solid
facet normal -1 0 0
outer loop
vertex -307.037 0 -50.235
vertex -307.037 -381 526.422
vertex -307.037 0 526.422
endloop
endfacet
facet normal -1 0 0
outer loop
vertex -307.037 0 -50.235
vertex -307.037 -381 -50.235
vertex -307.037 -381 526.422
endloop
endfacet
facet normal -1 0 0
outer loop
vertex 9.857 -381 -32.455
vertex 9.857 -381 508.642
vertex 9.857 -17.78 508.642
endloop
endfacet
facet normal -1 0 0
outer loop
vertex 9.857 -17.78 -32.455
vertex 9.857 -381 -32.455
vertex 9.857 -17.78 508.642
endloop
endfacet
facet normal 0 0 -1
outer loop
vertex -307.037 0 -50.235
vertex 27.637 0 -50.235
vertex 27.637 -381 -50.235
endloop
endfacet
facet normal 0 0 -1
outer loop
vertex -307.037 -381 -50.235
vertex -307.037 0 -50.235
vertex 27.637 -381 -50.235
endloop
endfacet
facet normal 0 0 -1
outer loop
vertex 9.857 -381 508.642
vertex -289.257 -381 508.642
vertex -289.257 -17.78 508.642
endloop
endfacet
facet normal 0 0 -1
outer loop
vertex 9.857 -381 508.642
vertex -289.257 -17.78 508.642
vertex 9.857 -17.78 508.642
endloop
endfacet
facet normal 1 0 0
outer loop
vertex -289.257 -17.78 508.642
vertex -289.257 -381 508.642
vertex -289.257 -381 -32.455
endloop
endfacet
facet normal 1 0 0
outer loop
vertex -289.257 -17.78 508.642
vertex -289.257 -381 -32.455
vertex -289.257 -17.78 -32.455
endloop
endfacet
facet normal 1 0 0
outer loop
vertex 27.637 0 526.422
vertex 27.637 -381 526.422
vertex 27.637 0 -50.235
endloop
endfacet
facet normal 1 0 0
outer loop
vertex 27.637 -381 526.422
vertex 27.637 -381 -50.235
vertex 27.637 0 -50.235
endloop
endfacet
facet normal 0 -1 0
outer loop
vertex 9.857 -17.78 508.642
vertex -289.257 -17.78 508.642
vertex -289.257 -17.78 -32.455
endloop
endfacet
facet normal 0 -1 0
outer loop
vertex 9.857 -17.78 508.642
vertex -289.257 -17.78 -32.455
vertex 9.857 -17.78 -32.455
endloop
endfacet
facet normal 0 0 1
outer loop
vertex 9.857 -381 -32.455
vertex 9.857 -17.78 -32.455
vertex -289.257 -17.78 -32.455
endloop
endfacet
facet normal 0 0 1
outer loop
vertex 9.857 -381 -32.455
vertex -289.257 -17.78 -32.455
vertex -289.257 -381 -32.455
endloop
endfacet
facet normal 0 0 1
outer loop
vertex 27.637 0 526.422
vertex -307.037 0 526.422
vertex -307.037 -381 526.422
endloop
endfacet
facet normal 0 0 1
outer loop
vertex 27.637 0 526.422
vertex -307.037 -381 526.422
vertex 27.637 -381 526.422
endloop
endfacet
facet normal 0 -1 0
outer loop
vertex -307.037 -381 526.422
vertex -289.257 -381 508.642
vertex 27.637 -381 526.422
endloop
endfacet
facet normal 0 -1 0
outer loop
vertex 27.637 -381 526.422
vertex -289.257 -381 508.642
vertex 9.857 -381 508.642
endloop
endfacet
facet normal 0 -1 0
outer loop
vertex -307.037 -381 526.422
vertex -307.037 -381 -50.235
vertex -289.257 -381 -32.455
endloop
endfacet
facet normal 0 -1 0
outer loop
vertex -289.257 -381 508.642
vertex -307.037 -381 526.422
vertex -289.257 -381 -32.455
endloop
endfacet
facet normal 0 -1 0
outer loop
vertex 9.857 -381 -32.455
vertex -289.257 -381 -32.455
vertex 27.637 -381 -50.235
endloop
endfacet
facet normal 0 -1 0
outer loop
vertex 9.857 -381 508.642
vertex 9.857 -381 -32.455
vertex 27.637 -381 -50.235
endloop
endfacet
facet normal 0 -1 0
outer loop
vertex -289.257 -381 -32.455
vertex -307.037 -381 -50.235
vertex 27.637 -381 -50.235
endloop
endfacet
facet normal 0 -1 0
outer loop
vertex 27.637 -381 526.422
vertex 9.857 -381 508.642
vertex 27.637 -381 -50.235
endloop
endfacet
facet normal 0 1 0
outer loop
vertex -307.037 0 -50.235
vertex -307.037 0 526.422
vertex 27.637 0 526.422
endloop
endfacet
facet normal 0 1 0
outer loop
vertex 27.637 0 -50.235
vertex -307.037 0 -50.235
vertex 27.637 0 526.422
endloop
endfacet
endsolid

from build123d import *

# Parameters (mm, degrees)
F0_W     = 55.2740842104
F0_H     = 94.0575622953
F1_DEPTH = 381
F2_DEPTH = 279.4
F3_W     = 334.6740842104
F3_H     = 381
F4_DEPTH = 482.6
F5_T     = -17.78


with BuildPart() as f1:
    # F0 (on Front) → F1 (new body)
    with BuildSketch(Plane.XZ):
        with Locations((0, -3.2065075357)):
            Rectangle(F0_W, F0_H)
    extrude(amount=F1_DEPTH)

    # F2 (add): a face of the model
    f2_faces = [f1.faces().sort_by_distance(p)[0] for p in [
        (-27.6370421052, -190.5, -3.2065075357),
    ]]
    extrude(f2_faces, amount=F2_DEPTH)

    # F3 (on face) → F4 (join)
    with BuildSketch(Plane.XY.offset(43.822273612)):
        with Locations((-139.7, -190.5)):
            Rectangle(F3_W, F3_H)
    extrude(amount=F4_DEPTH)

    # F5
    f5_openings = [f1.faces().sort_by_distance(p)[0] for p in [
        (-139.7, -381, 238.093492),
    ]]
    offset(amount=F5_T, openings=f5_openings)


solid = f1.part
